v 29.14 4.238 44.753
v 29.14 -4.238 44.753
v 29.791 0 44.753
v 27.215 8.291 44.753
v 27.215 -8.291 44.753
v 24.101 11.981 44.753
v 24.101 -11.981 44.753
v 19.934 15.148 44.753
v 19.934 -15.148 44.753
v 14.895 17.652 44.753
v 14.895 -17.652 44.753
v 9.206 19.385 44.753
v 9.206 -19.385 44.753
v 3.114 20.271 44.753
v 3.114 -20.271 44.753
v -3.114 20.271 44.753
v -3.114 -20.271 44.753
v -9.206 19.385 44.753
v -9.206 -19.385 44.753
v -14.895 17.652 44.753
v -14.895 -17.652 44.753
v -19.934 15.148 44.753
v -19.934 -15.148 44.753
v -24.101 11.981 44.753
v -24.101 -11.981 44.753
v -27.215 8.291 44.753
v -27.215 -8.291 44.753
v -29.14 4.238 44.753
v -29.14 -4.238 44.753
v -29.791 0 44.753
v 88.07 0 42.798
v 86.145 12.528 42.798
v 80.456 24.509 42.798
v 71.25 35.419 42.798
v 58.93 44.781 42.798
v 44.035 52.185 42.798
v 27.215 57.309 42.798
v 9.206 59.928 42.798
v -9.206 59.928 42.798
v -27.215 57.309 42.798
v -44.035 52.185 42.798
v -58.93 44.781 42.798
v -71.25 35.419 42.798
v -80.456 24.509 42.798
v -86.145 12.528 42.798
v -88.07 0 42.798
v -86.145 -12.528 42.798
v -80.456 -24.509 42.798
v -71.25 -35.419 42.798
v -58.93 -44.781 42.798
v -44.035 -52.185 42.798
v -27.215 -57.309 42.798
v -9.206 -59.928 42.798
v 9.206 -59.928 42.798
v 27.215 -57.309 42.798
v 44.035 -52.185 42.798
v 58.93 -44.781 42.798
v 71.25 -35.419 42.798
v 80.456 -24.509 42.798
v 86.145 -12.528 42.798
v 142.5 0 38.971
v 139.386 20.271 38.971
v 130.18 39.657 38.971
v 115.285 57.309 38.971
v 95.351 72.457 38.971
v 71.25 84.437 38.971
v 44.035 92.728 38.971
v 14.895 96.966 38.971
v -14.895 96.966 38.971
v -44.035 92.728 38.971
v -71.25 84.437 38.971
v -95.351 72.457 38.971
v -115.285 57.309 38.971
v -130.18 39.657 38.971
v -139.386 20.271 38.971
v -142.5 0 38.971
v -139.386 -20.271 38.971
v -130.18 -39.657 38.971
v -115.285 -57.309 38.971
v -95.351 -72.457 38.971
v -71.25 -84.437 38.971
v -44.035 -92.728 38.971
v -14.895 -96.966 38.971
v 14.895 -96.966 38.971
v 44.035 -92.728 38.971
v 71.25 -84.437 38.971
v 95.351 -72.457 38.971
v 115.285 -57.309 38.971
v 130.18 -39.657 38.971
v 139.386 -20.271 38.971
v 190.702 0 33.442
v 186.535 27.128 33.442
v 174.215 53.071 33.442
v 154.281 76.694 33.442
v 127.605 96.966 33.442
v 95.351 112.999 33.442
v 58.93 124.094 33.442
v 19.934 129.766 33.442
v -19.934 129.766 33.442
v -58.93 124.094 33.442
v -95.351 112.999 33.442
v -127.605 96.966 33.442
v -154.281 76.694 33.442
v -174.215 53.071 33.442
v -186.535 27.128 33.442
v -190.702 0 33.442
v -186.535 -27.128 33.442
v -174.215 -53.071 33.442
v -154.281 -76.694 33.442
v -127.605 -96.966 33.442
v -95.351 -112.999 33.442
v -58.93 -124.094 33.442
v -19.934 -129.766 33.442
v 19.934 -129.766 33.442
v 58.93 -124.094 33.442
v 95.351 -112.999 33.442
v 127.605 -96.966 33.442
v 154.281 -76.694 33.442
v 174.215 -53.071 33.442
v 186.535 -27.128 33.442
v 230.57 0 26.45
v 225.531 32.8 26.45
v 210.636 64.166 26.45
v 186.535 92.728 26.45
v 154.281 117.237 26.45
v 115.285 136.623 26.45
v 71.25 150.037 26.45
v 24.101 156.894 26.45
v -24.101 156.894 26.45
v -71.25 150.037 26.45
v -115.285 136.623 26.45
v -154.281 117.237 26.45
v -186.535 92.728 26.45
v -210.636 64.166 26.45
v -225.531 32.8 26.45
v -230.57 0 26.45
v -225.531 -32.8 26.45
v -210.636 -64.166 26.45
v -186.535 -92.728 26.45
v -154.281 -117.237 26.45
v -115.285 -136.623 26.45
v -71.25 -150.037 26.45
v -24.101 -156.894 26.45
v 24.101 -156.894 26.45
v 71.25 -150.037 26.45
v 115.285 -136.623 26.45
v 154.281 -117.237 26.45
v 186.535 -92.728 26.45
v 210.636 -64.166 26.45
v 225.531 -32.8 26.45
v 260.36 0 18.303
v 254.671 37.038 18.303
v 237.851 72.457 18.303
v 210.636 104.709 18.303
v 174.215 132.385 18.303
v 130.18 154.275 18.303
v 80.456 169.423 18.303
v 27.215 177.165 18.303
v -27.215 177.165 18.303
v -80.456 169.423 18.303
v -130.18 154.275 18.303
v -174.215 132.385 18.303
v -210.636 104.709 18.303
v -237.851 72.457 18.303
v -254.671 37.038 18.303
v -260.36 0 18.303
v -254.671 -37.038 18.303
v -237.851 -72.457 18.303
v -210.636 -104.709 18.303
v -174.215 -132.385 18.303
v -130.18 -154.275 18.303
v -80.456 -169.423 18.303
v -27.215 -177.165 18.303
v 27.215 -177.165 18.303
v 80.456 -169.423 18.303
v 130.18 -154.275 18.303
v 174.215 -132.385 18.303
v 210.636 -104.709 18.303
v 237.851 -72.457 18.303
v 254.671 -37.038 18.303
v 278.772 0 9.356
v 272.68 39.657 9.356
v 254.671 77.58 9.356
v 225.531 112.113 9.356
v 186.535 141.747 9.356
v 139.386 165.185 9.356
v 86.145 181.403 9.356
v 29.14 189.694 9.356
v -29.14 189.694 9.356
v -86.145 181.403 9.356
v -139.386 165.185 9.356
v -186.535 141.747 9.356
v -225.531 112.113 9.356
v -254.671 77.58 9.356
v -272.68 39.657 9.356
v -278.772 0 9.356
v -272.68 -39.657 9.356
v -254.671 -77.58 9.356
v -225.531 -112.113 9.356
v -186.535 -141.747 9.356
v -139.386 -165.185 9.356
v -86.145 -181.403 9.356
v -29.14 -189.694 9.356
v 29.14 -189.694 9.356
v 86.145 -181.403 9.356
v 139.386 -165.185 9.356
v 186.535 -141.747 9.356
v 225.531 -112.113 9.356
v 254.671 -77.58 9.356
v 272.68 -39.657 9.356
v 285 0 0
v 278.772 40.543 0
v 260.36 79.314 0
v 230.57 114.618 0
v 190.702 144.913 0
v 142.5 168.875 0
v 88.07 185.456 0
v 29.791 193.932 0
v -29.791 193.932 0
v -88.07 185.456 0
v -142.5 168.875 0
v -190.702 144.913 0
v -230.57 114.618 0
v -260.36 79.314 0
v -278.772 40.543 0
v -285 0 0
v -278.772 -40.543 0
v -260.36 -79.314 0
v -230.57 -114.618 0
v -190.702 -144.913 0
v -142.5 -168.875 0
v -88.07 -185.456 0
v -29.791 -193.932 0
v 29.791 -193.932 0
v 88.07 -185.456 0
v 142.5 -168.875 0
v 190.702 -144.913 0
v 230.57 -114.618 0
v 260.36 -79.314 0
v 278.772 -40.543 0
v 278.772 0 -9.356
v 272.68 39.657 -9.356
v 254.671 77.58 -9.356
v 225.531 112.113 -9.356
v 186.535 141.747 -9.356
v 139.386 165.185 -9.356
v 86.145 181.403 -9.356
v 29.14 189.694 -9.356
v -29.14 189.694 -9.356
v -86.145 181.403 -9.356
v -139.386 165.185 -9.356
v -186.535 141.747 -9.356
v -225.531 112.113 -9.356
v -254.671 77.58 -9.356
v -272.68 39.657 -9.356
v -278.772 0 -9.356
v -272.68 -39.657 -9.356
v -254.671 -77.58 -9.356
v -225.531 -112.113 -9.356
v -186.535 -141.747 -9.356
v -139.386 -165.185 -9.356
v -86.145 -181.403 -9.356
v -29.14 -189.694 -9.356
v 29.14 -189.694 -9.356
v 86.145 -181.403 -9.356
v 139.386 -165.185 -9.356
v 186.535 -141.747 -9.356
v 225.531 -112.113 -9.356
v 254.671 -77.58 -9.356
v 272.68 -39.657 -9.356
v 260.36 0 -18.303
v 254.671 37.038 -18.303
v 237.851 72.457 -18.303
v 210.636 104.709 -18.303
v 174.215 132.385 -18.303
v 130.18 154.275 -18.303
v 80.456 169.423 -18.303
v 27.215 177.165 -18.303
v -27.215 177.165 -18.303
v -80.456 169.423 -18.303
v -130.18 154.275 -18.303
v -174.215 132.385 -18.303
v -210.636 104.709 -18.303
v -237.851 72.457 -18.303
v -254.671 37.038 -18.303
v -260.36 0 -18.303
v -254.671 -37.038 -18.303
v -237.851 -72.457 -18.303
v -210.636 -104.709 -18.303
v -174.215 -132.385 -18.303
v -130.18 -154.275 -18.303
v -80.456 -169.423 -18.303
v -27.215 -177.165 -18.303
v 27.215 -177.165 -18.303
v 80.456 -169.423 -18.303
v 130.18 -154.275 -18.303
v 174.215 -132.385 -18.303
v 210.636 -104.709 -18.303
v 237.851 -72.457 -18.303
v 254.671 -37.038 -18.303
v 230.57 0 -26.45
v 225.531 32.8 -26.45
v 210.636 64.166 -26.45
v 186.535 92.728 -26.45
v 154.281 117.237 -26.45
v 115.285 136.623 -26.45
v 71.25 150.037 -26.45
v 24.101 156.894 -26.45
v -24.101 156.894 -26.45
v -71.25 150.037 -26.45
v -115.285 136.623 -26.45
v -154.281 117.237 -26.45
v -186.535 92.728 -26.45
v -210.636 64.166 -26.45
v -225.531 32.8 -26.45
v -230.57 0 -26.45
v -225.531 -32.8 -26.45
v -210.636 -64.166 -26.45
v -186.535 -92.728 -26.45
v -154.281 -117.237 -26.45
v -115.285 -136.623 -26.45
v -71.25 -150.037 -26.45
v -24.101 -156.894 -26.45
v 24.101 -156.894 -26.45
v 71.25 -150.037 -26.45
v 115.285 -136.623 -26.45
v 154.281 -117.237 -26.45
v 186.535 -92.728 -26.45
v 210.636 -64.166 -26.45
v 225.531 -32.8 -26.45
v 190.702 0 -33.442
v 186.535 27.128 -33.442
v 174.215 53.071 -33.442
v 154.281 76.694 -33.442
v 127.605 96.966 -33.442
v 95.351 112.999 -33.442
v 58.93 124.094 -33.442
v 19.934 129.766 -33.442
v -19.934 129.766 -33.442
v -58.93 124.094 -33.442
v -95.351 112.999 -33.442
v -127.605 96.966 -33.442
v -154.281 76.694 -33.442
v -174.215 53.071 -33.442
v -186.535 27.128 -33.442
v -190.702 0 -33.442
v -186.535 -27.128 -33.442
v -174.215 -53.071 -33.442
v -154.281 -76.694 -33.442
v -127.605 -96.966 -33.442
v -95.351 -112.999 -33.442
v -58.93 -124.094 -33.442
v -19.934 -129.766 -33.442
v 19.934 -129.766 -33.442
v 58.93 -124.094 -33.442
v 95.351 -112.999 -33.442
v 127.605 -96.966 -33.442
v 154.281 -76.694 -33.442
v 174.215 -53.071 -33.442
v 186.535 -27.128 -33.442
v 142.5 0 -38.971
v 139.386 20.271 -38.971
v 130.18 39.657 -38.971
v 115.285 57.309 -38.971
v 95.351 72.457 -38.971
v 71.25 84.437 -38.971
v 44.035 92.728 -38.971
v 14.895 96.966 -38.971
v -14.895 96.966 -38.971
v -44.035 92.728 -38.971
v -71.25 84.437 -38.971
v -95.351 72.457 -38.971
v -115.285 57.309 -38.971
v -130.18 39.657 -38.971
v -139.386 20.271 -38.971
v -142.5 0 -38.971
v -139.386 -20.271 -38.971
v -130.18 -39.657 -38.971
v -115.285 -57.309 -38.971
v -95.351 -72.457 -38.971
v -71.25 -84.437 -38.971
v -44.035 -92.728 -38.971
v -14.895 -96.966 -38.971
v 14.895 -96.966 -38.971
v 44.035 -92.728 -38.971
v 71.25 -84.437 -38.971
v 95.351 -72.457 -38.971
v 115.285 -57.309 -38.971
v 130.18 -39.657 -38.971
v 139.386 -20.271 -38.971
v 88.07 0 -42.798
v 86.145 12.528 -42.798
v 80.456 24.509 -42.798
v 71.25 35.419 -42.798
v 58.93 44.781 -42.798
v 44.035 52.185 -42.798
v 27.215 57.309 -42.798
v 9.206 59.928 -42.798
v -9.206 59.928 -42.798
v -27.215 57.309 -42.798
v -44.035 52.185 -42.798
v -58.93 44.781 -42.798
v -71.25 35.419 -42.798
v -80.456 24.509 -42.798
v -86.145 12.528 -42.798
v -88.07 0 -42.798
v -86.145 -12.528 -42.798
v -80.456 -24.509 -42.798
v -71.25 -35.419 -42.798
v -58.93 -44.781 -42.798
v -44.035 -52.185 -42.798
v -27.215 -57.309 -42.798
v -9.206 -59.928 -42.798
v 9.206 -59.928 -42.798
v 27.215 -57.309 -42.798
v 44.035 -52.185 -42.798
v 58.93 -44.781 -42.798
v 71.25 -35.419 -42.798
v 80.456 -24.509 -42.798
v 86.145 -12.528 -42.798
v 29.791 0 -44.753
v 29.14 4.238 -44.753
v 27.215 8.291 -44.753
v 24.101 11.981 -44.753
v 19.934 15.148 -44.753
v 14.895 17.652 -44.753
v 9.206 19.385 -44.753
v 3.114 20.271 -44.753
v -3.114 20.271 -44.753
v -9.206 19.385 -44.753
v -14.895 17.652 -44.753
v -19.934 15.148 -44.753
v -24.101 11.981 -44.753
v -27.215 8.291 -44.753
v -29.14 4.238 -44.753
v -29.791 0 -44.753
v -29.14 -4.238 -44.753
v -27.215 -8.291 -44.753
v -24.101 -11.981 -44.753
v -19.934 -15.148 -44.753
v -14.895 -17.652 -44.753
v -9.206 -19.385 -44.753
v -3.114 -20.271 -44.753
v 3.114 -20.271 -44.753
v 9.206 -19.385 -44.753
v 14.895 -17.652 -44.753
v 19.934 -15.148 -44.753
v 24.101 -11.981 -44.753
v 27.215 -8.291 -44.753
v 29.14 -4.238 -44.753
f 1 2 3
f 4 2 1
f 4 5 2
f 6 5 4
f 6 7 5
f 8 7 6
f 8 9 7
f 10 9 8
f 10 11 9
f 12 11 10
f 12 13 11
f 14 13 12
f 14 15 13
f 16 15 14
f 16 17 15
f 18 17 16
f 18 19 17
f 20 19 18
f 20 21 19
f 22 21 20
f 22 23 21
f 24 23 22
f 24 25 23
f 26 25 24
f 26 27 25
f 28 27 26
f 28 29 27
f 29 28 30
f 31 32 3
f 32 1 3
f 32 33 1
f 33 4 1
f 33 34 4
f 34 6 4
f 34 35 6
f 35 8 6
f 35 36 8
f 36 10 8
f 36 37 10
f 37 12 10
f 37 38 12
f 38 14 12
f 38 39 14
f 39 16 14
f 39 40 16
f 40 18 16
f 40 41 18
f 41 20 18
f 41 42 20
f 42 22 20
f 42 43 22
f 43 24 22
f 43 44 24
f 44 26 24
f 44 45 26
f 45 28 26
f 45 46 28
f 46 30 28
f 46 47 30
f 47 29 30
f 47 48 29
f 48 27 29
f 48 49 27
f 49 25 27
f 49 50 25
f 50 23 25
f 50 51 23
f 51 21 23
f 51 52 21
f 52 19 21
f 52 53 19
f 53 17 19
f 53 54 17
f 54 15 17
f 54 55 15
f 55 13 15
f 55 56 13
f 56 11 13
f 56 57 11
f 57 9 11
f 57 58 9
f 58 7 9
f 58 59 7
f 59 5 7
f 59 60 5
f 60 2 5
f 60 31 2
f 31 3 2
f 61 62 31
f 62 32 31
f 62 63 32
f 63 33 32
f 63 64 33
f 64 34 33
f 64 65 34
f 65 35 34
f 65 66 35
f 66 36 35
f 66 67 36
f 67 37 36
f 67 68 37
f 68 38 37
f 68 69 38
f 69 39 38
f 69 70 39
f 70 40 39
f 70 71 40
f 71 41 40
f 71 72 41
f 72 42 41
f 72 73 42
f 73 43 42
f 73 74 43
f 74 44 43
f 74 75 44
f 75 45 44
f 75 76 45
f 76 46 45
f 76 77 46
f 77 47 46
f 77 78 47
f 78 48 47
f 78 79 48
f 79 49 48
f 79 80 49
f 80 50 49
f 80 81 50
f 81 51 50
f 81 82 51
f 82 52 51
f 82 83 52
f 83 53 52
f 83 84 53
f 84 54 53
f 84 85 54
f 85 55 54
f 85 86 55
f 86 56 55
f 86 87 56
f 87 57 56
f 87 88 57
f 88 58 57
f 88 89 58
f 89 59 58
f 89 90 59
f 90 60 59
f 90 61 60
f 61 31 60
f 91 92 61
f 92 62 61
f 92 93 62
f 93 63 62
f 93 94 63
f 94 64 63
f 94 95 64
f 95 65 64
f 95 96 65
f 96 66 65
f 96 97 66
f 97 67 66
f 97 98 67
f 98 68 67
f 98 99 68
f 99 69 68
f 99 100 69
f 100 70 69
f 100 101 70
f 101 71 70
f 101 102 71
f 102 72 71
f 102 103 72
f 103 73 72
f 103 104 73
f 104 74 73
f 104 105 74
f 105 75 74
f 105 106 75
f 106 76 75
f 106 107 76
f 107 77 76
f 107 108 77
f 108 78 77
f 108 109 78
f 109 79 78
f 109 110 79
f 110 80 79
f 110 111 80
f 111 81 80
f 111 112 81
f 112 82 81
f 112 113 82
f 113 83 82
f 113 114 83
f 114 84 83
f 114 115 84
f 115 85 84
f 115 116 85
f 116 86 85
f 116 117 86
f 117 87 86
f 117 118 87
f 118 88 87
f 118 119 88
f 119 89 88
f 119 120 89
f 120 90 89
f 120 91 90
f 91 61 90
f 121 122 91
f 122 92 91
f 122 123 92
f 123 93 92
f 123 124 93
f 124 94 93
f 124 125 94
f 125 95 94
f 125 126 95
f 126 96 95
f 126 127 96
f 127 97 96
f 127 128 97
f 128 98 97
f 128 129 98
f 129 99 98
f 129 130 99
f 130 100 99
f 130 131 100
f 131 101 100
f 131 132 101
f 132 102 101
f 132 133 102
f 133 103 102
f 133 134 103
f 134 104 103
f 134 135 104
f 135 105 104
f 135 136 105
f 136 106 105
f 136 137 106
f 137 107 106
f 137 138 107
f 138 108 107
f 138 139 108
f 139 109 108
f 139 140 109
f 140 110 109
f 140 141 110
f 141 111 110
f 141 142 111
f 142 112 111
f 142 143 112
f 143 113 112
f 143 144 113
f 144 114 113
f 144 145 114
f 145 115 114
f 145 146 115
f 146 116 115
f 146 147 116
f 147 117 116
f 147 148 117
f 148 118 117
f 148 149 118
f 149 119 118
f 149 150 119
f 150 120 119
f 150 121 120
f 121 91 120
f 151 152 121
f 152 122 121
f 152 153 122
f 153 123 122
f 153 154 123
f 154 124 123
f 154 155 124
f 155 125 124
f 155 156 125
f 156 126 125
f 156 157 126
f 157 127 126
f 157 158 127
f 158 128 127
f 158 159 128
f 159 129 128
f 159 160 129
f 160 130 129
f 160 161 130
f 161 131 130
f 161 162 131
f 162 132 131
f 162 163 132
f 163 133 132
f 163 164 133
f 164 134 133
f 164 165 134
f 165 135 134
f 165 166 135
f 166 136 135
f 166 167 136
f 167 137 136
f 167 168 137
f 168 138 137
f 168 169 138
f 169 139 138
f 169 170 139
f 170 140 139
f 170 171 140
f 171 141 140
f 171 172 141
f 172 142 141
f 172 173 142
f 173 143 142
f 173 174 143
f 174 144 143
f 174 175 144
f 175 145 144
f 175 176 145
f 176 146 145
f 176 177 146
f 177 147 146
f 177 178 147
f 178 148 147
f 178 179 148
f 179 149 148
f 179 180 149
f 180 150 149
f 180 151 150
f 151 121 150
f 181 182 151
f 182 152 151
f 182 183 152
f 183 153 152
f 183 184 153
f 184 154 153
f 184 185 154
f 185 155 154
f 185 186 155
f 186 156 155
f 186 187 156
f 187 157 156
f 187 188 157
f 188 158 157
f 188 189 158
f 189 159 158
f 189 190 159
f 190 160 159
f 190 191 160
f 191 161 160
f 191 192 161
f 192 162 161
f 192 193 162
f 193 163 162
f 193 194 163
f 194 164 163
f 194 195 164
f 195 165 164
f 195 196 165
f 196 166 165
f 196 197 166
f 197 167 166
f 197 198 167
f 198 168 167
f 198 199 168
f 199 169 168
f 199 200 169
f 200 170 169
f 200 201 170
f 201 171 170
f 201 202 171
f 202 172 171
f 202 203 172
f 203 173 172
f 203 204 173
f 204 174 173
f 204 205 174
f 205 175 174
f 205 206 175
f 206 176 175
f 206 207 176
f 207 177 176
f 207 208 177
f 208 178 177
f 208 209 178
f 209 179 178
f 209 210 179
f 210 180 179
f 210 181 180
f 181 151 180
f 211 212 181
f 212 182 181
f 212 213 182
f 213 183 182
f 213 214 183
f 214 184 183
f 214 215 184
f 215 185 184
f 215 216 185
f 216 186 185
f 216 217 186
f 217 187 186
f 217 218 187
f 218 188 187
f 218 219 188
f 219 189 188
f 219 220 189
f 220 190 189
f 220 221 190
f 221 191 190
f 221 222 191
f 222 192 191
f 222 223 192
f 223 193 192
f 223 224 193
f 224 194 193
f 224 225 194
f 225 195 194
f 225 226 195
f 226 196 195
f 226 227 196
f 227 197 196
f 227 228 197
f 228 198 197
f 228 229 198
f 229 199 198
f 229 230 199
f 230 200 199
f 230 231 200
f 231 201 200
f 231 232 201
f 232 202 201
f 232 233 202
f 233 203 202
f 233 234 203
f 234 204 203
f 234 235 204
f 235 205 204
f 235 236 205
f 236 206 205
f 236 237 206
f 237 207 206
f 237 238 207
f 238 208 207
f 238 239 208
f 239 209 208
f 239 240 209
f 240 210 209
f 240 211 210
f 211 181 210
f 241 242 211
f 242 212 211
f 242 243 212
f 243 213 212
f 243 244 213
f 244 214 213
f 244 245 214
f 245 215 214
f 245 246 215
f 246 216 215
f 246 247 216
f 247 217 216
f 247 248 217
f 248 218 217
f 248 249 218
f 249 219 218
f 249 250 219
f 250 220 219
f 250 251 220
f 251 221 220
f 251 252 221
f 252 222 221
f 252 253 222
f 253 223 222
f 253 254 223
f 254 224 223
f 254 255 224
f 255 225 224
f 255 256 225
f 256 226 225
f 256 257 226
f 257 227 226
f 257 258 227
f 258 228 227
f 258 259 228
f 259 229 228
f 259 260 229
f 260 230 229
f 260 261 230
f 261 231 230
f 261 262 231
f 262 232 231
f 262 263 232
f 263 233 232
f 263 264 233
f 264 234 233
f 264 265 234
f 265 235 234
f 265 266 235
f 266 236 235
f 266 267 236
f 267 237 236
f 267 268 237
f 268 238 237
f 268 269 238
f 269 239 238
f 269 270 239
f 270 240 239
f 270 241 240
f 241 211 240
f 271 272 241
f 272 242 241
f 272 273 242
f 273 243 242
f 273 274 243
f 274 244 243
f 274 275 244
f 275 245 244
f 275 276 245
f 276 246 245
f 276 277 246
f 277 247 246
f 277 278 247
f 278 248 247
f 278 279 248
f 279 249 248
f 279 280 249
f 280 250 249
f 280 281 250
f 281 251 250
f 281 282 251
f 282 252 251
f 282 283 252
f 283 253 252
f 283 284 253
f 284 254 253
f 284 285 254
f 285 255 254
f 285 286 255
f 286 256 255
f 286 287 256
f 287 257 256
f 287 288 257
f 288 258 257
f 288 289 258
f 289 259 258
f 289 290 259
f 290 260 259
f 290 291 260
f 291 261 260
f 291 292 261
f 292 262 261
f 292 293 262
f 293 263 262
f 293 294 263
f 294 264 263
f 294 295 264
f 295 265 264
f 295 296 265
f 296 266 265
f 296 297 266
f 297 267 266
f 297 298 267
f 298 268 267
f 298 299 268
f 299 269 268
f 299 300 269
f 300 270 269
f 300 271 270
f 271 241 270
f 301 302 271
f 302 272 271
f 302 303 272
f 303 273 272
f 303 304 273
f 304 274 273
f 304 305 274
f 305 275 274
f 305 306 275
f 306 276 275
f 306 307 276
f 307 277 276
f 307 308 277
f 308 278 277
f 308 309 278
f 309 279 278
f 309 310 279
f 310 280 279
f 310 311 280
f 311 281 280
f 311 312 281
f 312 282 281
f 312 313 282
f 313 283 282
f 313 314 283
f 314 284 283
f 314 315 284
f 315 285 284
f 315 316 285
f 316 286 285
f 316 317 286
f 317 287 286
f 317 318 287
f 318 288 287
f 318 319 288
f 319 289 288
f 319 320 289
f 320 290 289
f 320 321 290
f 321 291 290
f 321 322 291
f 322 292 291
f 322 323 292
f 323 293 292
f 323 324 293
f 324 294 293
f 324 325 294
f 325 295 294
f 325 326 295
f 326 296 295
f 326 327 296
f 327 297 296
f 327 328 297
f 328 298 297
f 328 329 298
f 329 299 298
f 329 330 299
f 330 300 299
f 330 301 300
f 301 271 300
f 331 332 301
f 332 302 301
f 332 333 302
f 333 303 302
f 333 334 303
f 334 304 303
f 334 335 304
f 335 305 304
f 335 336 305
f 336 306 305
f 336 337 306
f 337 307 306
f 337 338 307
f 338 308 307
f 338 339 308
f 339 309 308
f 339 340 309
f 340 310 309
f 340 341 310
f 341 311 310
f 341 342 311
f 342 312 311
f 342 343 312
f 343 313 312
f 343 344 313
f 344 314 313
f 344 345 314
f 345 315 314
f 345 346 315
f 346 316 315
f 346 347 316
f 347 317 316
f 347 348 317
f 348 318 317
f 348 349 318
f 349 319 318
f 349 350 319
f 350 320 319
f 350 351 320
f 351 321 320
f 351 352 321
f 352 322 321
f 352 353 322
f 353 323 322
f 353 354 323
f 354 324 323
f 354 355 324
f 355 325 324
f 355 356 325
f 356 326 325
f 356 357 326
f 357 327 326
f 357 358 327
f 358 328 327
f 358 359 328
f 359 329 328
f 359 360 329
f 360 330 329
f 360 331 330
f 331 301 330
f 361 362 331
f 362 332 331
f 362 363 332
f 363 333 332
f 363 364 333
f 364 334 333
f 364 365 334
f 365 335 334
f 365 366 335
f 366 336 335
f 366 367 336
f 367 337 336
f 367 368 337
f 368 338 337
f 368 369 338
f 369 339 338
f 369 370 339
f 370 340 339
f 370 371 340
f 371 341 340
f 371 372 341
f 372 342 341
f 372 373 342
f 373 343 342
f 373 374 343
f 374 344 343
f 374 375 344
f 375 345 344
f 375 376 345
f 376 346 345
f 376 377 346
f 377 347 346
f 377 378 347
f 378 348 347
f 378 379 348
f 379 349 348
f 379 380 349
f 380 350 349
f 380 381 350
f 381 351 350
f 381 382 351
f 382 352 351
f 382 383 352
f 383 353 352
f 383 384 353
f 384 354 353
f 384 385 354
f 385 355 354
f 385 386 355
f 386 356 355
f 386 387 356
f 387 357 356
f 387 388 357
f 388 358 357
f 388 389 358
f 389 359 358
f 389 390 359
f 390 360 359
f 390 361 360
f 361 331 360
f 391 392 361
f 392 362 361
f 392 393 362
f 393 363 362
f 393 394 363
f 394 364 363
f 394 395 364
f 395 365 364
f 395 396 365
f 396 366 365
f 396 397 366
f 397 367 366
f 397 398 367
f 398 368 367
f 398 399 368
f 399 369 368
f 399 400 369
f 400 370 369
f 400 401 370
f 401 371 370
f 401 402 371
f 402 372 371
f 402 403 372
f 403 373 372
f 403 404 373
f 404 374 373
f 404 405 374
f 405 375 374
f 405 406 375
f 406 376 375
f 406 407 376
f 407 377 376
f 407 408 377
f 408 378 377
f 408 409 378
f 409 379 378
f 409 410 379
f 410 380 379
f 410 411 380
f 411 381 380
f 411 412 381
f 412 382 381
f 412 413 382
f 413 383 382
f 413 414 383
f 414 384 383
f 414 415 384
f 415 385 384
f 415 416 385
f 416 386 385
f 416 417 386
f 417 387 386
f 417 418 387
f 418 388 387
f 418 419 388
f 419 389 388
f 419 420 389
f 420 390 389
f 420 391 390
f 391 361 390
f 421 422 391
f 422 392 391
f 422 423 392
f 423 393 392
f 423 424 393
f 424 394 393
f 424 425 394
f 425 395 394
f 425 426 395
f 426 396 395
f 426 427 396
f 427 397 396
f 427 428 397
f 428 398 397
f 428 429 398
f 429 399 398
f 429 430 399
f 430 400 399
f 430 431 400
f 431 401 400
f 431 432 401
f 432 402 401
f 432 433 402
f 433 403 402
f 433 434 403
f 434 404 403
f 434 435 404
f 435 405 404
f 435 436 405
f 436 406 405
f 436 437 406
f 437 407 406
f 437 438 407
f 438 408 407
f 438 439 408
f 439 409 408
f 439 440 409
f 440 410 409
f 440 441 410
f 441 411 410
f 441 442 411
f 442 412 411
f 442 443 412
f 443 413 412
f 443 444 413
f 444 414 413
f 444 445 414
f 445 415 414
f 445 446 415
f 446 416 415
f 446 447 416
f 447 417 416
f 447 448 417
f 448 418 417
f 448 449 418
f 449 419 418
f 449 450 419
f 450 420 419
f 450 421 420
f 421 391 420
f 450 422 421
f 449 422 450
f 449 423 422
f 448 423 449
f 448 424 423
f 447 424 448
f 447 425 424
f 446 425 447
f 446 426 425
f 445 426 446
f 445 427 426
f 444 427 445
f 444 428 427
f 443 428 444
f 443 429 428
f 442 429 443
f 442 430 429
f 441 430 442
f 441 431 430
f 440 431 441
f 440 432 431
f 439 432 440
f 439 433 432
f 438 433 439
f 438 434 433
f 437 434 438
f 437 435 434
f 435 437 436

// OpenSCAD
// Generated by SolidPython 1.0.1 on 2020-07-29 00:46:54


scale(v = [19, 13, 3]) {
	sphere(r = 15);
}
/***********************************************
*********      SolidPython code:      **********
************************************************
 
# import packages: SolidPython
from solid import *
from solid.utils import *
from itertools import chain, combinations, permutations


class Resize:

    def __init__(self, scad_file):
        self.scad_file = scad_file
        #self.scad_file = import_scad(scad_file)
        # cone/cylinder param:
        self.r1 = 0
        self.r2 = 0
        self.h = 0
        # rectangular prism param:
        self.w = 0
        self.l = 0
        # ellipse param:
        self.r = 0

    # import OpenScad code (file name corresponds to shape)


    # classify shape + parameters
    def assign(self, param1, param2, param3):
        if self.scad_file == 'cone.scad':
            self.r1 = param1
            self.r2 = param2
            self.h = param3
        elif self.scad_file == 'cylinder.scad':
            self.r1 = param1
            self.r2 = param2
            self.h = param3
        elif self.scad_file == 'rectangularPrism.scad':
            self.h = param1
            self.l = param2
            self.w = param3
        else:
            self.r = param1
            self.h = param2

    # resize parameters
    def iterate(self):
        x = range(3, 20, 2)
        i = 1
        if self.scad_file == 'cone.scad':
            tempList = list(permutations(x, 2))
            for temp in tempList:
                param1 = temp[0]
                param2 = temp[1]
                filepath = 'produced_scad_files/' + 'cone' + str(param1) + '_' + str(param2) + '_' + '.scad'
                scad_render_to_file(cylinder(h=param1, r1=param2, r2=0), filepath)

        elif self.scad_file == 'cylinder.scad':
            tempList = list(permutations(x, 3))
            for temp in tempList:
                param1 = temp[0]
                param2 = temp[1]
                filepath = 'produced_scad_files/' + 'cylinder' + str(param1) + '_' + str(param2) + '_' + '.scad'
                scad_render_to_file(cylinder(h=param1, r1=param2, r2=param2), filepath)

        elif self.scad_file == 'rectangularPrism.scad':
            tempList = list(permutations(x, 3))
            for temp in tempList:
                param1 = temp[0]
                param2 = temp[1]
                param3 = temp[2]
                filepath = 'produced_scad_files/' + 'rectangularPrism' + str(param1) + '_' + str(param2) + '_' + str(
                    param3) + '.scad'
                scad_render_to_file(cube(size=(param1, param2, param3)), filepath)

        elif self.scad_file == 'ellipse.scad':
            tempList = list(permutations(x, 4))
            for temp in tempList:
                param1 = temp[0]
                param2 = temp[1]
                param3 = temp[2]
                param4 = temp[3]
                filepath = 'produced_scad_files/' + 'ellipse' + str(param1) + '_' + str(param2) + '_' + str(param3) + '_' + str(param4) + '.scad'
                scad_render_to_file(scale([param1, param2, param3])(sphere(r=param4)), filepath)

    def render_to_scadfile(self):
        scad_render_to_file(scad, 'example.scad') 
 
************************************************/
